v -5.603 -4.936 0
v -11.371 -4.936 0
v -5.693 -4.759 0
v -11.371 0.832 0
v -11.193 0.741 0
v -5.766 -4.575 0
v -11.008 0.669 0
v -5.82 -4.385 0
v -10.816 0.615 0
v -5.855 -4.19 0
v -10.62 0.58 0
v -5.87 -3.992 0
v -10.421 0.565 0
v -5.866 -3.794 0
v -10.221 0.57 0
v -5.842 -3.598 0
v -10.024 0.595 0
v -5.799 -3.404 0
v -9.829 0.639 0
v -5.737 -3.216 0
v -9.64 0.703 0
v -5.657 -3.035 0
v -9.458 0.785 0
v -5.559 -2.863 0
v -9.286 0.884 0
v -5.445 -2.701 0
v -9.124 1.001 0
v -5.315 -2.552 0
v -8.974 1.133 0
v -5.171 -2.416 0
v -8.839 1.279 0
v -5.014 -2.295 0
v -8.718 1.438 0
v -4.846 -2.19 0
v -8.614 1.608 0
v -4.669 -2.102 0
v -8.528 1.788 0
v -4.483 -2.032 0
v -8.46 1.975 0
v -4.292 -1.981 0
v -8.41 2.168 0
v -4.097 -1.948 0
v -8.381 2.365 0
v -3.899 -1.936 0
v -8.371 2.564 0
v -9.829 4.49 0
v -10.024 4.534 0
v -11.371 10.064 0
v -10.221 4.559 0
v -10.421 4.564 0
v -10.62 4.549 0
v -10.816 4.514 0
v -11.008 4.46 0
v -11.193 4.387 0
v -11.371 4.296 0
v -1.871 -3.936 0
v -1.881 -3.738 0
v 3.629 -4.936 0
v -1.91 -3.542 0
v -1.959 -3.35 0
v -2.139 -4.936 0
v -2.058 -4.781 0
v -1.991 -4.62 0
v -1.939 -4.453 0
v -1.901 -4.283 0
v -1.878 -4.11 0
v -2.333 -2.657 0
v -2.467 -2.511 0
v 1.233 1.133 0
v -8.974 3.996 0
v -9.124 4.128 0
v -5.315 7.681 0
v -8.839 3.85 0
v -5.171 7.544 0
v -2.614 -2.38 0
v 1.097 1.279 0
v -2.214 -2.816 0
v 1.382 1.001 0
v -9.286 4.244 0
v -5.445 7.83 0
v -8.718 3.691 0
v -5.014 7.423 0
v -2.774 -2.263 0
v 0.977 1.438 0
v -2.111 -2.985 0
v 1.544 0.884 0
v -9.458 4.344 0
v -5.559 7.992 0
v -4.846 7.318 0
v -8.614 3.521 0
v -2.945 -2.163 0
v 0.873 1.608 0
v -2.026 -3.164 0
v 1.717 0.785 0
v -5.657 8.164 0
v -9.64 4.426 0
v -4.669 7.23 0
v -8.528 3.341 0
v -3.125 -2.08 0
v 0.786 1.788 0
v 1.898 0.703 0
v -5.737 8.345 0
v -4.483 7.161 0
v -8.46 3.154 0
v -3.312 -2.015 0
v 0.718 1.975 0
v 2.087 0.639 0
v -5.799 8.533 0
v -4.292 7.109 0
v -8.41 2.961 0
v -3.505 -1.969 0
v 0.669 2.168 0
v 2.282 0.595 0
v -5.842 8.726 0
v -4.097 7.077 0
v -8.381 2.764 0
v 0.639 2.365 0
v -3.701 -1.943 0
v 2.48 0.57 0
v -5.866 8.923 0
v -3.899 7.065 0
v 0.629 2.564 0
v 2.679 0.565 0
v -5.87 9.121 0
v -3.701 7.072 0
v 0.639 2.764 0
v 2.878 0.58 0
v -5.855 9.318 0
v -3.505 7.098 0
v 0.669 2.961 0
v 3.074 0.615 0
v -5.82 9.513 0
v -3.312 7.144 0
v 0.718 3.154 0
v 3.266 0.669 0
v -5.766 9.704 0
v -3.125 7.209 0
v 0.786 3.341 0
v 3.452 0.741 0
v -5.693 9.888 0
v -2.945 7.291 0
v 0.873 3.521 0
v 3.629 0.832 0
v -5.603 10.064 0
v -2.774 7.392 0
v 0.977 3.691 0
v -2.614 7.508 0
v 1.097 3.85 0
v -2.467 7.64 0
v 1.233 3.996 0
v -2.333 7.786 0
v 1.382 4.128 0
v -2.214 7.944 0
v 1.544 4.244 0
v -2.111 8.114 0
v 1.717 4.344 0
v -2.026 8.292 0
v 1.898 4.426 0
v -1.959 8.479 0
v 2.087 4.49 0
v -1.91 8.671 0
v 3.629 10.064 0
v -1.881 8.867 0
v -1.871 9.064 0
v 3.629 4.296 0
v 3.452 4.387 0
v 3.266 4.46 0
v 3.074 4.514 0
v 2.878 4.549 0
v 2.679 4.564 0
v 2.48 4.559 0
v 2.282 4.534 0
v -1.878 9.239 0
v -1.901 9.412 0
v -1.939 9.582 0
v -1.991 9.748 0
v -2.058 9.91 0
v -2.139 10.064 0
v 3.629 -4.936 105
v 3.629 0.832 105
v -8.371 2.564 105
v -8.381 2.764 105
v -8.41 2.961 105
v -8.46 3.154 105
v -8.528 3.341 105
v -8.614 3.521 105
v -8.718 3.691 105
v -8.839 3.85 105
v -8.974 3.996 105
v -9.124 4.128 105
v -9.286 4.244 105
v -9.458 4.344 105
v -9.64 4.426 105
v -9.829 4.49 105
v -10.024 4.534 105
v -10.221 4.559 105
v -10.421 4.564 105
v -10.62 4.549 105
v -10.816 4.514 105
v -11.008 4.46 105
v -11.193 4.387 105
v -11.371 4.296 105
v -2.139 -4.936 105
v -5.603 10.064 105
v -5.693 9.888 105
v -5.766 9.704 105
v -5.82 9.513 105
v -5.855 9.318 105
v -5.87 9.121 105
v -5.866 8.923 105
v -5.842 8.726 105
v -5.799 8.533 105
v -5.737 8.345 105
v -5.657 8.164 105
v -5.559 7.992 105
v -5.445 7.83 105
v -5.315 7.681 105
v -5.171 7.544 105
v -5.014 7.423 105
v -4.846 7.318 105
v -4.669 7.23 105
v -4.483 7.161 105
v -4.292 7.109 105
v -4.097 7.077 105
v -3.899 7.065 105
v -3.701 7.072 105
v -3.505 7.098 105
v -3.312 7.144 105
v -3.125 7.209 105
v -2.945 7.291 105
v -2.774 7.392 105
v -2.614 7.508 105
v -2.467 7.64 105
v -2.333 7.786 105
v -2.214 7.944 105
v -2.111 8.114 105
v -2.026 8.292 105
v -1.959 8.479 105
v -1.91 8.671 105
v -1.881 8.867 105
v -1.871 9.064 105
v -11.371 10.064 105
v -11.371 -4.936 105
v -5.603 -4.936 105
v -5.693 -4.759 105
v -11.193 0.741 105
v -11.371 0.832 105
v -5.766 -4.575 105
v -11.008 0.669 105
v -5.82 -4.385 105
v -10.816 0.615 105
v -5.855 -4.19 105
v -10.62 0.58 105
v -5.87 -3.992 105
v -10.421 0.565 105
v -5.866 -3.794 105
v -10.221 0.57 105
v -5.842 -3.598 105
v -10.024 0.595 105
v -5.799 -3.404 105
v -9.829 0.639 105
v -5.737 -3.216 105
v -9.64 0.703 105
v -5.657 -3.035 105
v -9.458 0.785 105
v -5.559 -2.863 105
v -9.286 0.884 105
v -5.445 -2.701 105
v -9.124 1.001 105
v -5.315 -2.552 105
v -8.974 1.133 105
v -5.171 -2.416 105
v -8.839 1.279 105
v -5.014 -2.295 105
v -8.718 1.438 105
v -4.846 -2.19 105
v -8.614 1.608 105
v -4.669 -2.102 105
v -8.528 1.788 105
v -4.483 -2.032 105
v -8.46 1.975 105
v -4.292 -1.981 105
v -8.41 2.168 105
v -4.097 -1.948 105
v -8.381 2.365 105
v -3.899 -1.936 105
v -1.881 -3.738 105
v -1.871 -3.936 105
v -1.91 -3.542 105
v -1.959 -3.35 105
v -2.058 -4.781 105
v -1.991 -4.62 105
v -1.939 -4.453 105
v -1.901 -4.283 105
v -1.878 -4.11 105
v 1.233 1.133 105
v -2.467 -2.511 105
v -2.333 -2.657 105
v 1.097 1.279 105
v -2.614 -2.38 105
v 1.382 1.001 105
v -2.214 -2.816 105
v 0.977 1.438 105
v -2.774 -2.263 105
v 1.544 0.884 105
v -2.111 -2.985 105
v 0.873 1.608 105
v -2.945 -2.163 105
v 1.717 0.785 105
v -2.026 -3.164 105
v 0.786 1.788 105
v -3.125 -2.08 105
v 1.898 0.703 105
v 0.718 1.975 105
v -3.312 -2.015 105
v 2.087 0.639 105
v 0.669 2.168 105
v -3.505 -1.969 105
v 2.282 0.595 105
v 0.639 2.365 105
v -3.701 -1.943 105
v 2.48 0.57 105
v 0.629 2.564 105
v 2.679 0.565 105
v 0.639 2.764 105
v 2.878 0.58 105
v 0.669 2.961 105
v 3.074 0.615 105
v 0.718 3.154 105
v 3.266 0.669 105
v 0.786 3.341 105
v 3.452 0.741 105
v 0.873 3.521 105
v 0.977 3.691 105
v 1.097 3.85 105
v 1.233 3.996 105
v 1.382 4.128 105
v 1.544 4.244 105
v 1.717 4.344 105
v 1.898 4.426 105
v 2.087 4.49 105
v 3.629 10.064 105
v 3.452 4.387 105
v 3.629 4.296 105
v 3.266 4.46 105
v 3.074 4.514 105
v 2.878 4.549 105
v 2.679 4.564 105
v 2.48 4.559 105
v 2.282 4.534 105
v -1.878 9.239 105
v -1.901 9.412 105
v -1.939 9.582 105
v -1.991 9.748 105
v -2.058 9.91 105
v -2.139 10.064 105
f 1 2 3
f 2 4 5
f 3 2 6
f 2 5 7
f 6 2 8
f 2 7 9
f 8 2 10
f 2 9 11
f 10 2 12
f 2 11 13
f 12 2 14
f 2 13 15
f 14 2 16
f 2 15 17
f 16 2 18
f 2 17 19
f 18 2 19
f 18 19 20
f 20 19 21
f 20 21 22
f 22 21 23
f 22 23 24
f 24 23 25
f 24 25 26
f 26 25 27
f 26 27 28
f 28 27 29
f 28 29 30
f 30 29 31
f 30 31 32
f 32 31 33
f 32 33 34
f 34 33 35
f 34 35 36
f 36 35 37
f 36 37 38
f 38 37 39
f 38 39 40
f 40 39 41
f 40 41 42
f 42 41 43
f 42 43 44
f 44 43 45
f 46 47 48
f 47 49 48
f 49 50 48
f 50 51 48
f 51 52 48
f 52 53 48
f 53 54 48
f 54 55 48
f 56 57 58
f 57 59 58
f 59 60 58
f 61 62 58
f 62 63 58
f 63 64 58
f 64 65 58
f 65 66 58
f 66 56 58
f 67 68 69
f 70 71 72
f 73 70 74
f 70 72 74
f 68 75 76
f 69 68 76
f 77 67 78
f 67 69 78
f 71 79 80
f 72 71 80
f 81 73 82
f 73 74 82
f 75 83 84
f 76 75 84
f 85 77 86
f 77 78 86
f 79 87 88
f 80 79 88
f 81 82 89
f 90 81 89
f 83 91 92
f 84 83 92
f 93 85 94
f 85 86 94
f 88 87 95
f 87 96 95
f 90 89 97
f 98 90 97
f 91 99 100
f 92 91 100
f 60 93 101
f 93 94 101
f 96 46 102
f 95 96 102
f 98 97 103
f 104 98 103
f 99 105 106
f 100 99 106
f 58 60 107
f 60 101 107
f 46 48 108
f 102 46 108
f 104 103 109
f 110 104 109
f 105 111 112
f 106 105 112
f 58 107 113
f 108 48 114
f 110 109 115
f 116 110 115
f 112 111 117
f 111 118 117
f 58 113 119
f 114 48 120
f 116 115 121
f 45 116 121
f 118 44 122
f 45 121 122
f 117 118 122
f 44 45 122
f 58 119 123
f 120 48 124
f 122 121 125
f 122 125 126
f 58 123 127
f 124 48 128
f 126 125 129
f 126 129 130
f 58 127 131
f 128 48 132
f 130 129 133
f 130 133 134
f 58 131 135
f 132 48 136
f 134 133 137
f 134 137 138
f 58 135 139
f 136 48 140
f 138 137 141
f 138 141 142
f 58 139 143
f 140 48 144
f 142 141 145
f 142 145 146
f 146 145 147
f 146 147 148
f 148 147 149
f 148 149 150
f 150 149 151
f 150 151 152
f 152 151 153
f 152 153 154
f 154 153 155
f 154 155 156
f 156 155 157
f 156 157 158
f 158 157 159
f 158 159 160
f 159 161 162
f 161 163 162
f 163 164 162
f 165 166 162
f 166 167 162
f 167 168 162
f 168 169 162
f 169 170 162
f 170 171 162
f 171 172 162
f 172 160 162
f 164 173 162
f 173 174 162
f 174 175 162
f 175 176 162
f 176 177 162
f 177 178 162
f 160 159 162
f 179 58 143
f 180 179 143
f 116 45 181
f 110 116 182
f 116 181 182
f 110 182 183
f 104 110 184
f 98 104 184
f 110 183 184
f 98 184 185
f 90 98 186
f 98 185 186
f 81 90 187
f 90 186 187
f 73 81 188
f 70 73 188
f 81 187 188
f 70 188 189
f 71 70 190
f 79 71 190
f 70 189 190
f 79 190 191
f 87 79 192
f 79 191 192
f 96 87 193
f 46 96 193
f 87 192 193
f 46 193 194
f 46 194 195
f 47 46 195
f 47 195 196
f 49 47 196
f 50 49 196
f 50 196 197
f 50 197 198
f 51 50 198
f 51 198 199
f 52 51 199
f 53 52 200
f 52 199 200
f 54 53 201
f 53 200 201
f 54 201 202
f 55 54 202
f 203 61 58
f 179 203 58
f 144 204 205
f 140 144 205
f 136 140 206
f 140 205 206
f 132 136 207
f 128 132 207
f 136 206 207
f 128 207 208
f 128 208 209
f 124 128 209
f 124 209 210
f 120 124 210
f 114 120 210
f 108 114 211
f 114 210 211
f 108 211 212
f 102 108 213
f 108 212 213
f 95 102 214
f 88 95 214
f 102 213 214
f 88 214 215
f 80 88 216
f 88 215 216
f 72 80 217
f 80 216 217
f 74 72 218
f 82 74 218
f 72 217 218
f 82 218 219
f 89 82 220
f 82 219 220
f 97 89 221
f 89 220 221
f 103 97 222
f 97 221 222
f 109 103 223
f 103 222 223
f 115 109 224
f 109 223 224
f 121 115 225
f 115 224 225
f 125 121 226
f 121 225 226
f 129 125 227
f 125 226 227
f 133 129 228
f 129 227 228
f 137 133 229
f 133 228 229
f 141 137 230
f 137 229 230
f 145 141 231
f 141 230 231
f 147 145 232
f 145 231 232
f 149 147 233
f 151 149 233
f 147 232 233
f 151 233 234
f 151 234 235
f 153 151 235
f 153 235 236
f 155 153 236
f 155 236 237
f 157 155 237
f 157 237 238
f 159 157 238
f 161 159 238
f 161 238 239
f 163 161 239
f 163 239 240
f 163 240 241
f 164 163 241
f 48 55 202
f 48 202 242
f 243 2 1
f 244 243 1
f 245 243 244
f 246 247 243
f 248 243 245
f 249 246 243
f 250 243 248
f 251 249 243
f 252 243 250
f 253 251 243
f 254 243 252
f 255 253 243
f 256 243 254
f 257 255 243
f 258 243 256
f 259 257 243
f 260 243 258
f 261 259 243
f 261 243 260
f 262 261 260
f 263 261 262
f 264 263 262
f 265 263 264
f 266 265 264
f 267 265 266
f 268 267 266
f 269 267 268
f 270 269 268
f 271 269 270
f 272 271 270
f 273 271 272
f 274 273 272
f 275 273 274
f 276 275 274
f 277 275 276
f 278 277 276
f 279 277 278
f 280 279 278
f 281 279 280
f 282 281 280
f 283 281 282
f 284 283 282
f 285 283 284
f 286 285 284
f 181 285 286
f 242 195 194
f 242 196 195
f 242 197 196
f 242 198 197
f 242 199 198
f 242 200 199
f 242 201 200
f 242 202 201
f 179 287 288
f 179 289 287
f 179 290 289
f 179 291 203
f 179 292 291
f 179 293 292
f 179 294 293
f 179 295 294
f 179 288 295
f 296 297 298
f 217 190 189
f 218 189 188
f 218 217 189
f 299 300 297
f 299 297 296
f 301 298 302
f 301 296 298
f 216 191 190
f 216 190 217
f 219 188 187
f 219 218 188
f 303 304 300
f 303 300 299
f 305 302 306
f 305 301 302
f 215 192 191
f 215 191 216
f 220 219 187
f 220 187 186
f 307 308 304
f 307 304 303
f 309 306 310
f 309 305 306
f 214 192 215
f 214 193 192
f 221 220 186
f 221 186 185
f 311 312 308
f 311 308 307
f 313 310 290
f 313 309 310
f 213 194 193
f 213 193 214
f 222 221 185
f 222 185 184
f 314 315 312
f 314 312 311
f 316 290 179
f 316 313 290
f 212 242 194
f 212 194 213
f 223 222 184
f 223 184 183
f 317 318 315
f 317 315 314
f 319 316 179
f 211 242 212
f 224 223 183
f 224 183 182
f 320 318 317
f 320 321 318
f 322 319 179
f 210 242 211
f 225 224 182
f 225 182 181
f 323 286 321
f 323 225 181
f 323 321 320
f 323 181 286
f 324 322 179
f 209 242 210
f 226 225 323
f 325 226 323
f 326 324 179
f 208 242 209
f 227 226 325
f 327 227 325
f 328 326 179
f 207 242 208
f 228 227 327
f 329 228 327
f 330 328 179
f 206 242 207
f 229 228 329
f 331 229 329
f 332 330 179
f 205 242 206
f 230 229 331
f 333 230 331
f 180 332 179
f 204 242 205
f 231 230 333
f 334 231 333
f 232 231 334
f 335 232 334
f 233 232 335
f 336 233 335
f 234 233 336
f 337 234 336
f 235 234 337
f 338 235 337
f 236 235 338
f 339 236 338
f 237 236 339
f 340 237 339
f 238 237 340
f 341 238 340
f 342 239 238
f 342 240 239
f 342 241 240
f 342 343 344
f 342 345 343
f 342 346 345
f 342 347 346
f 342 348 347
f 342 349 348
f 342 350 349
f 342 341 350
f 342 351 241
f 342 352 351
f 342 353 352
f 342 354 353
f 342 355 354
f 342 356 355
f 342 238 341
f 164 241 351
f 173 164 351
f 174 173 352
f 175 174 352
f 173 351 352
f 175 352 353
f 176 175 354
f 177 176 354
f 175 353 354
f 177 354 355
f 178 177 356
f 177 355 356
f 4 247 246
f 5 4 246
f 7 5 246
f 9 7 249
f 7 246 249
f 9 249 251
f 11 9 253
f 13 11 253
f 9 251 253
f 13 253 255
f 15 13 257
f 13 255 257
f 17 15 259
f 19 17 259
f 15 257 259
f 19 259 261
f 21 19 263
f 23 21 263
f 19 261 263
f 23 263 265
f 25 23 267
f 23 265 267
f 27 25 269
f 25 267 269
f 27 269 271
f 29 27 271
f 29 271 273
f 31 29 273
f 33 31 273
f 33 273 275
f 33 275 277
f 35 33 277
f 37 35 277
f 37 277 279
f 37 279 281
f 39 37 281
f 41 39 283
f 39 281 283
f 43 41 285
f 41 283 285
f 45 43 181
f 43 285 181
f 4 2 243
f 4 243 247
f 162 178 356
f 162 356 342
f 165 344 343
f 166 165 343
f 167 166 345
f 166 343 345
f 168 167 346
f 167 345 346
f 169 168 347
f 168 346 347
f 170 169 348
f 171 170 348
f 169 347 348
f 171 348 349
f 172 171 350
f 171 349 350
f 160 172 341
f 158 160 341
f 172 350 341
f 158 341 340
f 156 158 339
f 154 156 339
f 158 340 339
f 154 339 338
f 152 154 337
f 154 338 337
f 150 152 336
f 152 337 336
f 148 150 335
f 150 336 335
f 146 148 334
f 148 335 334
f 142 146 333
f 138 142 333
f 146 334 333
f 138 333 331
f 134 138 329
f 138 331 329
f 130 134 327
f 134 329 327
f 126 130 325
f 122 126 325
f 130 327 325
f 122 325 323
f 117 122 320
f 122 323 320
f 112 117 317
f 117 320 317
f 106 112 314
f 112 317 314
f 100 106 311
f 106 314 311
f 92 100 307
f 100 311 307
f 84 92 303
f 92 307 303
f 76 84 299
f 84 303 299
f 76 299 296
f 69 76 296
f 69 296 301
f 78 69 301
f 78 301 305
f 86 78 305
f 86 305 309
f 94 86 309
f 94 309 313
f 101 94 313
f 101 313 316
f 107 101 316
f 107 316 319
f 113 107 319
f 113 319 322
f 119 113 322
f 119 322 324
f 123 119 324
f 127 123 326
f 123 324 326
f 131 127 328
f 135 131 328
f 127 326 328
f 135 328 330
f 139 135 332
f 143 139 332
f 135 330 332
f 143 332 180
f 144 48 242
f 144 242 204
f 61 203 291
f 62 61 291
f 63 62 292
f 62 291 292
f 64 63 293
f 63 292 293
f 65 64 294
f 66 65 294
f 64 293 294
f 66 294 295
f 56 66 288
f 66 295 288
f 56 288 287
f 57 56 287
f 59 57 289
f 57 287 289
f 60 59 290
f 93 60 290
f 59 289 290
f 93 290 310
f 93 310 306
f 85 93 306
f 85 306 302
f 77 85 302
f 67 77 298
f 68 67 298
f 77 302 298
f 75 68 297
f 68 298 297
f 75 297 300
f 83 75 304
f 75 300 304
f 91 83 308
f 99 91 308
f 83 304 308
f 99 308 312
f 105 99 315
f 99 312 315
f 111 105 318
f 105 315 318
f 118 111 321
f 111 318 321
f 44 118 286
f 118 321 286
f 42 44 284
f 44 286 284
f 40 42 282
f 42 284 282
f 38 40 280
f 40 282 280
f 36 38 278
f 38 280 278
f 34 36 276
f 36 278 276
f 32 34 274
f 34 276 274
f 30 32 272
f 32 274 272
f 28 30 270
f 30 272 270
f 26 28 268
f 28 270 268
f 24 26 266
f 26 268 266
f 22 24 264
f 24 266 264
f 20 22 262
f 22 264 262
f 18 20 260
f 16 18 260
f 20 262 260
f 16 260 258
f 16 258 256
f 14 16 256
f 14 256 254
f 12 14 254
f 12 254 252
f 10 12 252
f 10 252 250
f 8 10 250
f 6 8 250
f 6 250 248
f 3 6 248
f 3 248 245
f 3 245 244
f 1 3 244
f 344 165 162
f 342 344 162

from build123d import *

# Parameters (mm, degrees)
F0_W     = 15
F0_H     = 15
F1_DEPTH = 105
F3_DEPTH = 105
F5_DEPTH = 105
F7_DEPTH = 105


with BuildPart() as f1:
    # F0 (on Top) → F1 (new body)
    with BuildSketch(Plane.XY):
        with Locations((-3.8708411157, 2.5643814198)):
            Rectangle(F0_W, F0_H)
    extrude(amount=F1_DEPTH)

    # F2 (on face) → F3 (cut)
    with BuildSketch(Plane.XY.offset(105)):
        with BuildLine():
            ThreePointArc((-11.3708411157, 0.8323306122), (-9.3708411157, 0.8323306122), (-8.3708411157, 2.5643814198))
            ThreePointArc((-8.3708411157, 2.5643814198), (-9.3708411157, 4.2964322274), (-11.3708411157, 4.2964322274))
            Line((-11.3708411157, 4.2964322274), (-11.3708411157, 0.8323306122))
        make_face()
    extrude(amount=-F3_DEPTH, mode=Mode.SUBTRACT)

    # F4 (on face) → F5 (cut)
    with BuildSketch(Plane.XY.offset(105)):
        with BuildLine():
            ThreePointArc((-5.6028919233, 10.0643814198), (-4.3884792059, 7.1325297672), (-1.8708411157, 9.0643814198))
            ThreePointArc((-1.8708411157, 9.0643814198), (-1.9389894631, 9.58201951), (-2.1387903081, 10.0643814198))
            Line((-2.1387903081, 10.0643814198), (-5.6028919233, 10.0643814198))
        make_face()
    extrude(amount=-F5_DEPTH, mode=Mode.SUBTRACT)

    # F6 (on face) → F7 (cut)
    with BuildSketch(Plane.XY.offset(105)):
        with BuildLine():
            Line((-5.6028919233, -4.9356185802), (-2.1387903081, -4.9356185802))
            ThreePointArc((-2.1387903081, -4.9356185802), (-1.9389894631, -4.4532566704), (-1.8708411157, -3.9356185802))
            ThreePointArc((-1.8708411157, -3.9356185802), (-4.3884792059, -2.0037669276), (-5.6028919233, -4.9356185802))
        make_face()
        with BuildLine():
            Line((3.6291588843, 0.8323306122), (3.6291588843, 4.2964322274))
            ThreePointArc((3.6291588843, 4.2964322274), (0.6291588843, 2.5643814198), (3.6291588843, 0.8323306122))
        make_face()
    extrude(amount=-F7_DEPTH, mode=Mode.SUBTRACT)


solid = f1.part
